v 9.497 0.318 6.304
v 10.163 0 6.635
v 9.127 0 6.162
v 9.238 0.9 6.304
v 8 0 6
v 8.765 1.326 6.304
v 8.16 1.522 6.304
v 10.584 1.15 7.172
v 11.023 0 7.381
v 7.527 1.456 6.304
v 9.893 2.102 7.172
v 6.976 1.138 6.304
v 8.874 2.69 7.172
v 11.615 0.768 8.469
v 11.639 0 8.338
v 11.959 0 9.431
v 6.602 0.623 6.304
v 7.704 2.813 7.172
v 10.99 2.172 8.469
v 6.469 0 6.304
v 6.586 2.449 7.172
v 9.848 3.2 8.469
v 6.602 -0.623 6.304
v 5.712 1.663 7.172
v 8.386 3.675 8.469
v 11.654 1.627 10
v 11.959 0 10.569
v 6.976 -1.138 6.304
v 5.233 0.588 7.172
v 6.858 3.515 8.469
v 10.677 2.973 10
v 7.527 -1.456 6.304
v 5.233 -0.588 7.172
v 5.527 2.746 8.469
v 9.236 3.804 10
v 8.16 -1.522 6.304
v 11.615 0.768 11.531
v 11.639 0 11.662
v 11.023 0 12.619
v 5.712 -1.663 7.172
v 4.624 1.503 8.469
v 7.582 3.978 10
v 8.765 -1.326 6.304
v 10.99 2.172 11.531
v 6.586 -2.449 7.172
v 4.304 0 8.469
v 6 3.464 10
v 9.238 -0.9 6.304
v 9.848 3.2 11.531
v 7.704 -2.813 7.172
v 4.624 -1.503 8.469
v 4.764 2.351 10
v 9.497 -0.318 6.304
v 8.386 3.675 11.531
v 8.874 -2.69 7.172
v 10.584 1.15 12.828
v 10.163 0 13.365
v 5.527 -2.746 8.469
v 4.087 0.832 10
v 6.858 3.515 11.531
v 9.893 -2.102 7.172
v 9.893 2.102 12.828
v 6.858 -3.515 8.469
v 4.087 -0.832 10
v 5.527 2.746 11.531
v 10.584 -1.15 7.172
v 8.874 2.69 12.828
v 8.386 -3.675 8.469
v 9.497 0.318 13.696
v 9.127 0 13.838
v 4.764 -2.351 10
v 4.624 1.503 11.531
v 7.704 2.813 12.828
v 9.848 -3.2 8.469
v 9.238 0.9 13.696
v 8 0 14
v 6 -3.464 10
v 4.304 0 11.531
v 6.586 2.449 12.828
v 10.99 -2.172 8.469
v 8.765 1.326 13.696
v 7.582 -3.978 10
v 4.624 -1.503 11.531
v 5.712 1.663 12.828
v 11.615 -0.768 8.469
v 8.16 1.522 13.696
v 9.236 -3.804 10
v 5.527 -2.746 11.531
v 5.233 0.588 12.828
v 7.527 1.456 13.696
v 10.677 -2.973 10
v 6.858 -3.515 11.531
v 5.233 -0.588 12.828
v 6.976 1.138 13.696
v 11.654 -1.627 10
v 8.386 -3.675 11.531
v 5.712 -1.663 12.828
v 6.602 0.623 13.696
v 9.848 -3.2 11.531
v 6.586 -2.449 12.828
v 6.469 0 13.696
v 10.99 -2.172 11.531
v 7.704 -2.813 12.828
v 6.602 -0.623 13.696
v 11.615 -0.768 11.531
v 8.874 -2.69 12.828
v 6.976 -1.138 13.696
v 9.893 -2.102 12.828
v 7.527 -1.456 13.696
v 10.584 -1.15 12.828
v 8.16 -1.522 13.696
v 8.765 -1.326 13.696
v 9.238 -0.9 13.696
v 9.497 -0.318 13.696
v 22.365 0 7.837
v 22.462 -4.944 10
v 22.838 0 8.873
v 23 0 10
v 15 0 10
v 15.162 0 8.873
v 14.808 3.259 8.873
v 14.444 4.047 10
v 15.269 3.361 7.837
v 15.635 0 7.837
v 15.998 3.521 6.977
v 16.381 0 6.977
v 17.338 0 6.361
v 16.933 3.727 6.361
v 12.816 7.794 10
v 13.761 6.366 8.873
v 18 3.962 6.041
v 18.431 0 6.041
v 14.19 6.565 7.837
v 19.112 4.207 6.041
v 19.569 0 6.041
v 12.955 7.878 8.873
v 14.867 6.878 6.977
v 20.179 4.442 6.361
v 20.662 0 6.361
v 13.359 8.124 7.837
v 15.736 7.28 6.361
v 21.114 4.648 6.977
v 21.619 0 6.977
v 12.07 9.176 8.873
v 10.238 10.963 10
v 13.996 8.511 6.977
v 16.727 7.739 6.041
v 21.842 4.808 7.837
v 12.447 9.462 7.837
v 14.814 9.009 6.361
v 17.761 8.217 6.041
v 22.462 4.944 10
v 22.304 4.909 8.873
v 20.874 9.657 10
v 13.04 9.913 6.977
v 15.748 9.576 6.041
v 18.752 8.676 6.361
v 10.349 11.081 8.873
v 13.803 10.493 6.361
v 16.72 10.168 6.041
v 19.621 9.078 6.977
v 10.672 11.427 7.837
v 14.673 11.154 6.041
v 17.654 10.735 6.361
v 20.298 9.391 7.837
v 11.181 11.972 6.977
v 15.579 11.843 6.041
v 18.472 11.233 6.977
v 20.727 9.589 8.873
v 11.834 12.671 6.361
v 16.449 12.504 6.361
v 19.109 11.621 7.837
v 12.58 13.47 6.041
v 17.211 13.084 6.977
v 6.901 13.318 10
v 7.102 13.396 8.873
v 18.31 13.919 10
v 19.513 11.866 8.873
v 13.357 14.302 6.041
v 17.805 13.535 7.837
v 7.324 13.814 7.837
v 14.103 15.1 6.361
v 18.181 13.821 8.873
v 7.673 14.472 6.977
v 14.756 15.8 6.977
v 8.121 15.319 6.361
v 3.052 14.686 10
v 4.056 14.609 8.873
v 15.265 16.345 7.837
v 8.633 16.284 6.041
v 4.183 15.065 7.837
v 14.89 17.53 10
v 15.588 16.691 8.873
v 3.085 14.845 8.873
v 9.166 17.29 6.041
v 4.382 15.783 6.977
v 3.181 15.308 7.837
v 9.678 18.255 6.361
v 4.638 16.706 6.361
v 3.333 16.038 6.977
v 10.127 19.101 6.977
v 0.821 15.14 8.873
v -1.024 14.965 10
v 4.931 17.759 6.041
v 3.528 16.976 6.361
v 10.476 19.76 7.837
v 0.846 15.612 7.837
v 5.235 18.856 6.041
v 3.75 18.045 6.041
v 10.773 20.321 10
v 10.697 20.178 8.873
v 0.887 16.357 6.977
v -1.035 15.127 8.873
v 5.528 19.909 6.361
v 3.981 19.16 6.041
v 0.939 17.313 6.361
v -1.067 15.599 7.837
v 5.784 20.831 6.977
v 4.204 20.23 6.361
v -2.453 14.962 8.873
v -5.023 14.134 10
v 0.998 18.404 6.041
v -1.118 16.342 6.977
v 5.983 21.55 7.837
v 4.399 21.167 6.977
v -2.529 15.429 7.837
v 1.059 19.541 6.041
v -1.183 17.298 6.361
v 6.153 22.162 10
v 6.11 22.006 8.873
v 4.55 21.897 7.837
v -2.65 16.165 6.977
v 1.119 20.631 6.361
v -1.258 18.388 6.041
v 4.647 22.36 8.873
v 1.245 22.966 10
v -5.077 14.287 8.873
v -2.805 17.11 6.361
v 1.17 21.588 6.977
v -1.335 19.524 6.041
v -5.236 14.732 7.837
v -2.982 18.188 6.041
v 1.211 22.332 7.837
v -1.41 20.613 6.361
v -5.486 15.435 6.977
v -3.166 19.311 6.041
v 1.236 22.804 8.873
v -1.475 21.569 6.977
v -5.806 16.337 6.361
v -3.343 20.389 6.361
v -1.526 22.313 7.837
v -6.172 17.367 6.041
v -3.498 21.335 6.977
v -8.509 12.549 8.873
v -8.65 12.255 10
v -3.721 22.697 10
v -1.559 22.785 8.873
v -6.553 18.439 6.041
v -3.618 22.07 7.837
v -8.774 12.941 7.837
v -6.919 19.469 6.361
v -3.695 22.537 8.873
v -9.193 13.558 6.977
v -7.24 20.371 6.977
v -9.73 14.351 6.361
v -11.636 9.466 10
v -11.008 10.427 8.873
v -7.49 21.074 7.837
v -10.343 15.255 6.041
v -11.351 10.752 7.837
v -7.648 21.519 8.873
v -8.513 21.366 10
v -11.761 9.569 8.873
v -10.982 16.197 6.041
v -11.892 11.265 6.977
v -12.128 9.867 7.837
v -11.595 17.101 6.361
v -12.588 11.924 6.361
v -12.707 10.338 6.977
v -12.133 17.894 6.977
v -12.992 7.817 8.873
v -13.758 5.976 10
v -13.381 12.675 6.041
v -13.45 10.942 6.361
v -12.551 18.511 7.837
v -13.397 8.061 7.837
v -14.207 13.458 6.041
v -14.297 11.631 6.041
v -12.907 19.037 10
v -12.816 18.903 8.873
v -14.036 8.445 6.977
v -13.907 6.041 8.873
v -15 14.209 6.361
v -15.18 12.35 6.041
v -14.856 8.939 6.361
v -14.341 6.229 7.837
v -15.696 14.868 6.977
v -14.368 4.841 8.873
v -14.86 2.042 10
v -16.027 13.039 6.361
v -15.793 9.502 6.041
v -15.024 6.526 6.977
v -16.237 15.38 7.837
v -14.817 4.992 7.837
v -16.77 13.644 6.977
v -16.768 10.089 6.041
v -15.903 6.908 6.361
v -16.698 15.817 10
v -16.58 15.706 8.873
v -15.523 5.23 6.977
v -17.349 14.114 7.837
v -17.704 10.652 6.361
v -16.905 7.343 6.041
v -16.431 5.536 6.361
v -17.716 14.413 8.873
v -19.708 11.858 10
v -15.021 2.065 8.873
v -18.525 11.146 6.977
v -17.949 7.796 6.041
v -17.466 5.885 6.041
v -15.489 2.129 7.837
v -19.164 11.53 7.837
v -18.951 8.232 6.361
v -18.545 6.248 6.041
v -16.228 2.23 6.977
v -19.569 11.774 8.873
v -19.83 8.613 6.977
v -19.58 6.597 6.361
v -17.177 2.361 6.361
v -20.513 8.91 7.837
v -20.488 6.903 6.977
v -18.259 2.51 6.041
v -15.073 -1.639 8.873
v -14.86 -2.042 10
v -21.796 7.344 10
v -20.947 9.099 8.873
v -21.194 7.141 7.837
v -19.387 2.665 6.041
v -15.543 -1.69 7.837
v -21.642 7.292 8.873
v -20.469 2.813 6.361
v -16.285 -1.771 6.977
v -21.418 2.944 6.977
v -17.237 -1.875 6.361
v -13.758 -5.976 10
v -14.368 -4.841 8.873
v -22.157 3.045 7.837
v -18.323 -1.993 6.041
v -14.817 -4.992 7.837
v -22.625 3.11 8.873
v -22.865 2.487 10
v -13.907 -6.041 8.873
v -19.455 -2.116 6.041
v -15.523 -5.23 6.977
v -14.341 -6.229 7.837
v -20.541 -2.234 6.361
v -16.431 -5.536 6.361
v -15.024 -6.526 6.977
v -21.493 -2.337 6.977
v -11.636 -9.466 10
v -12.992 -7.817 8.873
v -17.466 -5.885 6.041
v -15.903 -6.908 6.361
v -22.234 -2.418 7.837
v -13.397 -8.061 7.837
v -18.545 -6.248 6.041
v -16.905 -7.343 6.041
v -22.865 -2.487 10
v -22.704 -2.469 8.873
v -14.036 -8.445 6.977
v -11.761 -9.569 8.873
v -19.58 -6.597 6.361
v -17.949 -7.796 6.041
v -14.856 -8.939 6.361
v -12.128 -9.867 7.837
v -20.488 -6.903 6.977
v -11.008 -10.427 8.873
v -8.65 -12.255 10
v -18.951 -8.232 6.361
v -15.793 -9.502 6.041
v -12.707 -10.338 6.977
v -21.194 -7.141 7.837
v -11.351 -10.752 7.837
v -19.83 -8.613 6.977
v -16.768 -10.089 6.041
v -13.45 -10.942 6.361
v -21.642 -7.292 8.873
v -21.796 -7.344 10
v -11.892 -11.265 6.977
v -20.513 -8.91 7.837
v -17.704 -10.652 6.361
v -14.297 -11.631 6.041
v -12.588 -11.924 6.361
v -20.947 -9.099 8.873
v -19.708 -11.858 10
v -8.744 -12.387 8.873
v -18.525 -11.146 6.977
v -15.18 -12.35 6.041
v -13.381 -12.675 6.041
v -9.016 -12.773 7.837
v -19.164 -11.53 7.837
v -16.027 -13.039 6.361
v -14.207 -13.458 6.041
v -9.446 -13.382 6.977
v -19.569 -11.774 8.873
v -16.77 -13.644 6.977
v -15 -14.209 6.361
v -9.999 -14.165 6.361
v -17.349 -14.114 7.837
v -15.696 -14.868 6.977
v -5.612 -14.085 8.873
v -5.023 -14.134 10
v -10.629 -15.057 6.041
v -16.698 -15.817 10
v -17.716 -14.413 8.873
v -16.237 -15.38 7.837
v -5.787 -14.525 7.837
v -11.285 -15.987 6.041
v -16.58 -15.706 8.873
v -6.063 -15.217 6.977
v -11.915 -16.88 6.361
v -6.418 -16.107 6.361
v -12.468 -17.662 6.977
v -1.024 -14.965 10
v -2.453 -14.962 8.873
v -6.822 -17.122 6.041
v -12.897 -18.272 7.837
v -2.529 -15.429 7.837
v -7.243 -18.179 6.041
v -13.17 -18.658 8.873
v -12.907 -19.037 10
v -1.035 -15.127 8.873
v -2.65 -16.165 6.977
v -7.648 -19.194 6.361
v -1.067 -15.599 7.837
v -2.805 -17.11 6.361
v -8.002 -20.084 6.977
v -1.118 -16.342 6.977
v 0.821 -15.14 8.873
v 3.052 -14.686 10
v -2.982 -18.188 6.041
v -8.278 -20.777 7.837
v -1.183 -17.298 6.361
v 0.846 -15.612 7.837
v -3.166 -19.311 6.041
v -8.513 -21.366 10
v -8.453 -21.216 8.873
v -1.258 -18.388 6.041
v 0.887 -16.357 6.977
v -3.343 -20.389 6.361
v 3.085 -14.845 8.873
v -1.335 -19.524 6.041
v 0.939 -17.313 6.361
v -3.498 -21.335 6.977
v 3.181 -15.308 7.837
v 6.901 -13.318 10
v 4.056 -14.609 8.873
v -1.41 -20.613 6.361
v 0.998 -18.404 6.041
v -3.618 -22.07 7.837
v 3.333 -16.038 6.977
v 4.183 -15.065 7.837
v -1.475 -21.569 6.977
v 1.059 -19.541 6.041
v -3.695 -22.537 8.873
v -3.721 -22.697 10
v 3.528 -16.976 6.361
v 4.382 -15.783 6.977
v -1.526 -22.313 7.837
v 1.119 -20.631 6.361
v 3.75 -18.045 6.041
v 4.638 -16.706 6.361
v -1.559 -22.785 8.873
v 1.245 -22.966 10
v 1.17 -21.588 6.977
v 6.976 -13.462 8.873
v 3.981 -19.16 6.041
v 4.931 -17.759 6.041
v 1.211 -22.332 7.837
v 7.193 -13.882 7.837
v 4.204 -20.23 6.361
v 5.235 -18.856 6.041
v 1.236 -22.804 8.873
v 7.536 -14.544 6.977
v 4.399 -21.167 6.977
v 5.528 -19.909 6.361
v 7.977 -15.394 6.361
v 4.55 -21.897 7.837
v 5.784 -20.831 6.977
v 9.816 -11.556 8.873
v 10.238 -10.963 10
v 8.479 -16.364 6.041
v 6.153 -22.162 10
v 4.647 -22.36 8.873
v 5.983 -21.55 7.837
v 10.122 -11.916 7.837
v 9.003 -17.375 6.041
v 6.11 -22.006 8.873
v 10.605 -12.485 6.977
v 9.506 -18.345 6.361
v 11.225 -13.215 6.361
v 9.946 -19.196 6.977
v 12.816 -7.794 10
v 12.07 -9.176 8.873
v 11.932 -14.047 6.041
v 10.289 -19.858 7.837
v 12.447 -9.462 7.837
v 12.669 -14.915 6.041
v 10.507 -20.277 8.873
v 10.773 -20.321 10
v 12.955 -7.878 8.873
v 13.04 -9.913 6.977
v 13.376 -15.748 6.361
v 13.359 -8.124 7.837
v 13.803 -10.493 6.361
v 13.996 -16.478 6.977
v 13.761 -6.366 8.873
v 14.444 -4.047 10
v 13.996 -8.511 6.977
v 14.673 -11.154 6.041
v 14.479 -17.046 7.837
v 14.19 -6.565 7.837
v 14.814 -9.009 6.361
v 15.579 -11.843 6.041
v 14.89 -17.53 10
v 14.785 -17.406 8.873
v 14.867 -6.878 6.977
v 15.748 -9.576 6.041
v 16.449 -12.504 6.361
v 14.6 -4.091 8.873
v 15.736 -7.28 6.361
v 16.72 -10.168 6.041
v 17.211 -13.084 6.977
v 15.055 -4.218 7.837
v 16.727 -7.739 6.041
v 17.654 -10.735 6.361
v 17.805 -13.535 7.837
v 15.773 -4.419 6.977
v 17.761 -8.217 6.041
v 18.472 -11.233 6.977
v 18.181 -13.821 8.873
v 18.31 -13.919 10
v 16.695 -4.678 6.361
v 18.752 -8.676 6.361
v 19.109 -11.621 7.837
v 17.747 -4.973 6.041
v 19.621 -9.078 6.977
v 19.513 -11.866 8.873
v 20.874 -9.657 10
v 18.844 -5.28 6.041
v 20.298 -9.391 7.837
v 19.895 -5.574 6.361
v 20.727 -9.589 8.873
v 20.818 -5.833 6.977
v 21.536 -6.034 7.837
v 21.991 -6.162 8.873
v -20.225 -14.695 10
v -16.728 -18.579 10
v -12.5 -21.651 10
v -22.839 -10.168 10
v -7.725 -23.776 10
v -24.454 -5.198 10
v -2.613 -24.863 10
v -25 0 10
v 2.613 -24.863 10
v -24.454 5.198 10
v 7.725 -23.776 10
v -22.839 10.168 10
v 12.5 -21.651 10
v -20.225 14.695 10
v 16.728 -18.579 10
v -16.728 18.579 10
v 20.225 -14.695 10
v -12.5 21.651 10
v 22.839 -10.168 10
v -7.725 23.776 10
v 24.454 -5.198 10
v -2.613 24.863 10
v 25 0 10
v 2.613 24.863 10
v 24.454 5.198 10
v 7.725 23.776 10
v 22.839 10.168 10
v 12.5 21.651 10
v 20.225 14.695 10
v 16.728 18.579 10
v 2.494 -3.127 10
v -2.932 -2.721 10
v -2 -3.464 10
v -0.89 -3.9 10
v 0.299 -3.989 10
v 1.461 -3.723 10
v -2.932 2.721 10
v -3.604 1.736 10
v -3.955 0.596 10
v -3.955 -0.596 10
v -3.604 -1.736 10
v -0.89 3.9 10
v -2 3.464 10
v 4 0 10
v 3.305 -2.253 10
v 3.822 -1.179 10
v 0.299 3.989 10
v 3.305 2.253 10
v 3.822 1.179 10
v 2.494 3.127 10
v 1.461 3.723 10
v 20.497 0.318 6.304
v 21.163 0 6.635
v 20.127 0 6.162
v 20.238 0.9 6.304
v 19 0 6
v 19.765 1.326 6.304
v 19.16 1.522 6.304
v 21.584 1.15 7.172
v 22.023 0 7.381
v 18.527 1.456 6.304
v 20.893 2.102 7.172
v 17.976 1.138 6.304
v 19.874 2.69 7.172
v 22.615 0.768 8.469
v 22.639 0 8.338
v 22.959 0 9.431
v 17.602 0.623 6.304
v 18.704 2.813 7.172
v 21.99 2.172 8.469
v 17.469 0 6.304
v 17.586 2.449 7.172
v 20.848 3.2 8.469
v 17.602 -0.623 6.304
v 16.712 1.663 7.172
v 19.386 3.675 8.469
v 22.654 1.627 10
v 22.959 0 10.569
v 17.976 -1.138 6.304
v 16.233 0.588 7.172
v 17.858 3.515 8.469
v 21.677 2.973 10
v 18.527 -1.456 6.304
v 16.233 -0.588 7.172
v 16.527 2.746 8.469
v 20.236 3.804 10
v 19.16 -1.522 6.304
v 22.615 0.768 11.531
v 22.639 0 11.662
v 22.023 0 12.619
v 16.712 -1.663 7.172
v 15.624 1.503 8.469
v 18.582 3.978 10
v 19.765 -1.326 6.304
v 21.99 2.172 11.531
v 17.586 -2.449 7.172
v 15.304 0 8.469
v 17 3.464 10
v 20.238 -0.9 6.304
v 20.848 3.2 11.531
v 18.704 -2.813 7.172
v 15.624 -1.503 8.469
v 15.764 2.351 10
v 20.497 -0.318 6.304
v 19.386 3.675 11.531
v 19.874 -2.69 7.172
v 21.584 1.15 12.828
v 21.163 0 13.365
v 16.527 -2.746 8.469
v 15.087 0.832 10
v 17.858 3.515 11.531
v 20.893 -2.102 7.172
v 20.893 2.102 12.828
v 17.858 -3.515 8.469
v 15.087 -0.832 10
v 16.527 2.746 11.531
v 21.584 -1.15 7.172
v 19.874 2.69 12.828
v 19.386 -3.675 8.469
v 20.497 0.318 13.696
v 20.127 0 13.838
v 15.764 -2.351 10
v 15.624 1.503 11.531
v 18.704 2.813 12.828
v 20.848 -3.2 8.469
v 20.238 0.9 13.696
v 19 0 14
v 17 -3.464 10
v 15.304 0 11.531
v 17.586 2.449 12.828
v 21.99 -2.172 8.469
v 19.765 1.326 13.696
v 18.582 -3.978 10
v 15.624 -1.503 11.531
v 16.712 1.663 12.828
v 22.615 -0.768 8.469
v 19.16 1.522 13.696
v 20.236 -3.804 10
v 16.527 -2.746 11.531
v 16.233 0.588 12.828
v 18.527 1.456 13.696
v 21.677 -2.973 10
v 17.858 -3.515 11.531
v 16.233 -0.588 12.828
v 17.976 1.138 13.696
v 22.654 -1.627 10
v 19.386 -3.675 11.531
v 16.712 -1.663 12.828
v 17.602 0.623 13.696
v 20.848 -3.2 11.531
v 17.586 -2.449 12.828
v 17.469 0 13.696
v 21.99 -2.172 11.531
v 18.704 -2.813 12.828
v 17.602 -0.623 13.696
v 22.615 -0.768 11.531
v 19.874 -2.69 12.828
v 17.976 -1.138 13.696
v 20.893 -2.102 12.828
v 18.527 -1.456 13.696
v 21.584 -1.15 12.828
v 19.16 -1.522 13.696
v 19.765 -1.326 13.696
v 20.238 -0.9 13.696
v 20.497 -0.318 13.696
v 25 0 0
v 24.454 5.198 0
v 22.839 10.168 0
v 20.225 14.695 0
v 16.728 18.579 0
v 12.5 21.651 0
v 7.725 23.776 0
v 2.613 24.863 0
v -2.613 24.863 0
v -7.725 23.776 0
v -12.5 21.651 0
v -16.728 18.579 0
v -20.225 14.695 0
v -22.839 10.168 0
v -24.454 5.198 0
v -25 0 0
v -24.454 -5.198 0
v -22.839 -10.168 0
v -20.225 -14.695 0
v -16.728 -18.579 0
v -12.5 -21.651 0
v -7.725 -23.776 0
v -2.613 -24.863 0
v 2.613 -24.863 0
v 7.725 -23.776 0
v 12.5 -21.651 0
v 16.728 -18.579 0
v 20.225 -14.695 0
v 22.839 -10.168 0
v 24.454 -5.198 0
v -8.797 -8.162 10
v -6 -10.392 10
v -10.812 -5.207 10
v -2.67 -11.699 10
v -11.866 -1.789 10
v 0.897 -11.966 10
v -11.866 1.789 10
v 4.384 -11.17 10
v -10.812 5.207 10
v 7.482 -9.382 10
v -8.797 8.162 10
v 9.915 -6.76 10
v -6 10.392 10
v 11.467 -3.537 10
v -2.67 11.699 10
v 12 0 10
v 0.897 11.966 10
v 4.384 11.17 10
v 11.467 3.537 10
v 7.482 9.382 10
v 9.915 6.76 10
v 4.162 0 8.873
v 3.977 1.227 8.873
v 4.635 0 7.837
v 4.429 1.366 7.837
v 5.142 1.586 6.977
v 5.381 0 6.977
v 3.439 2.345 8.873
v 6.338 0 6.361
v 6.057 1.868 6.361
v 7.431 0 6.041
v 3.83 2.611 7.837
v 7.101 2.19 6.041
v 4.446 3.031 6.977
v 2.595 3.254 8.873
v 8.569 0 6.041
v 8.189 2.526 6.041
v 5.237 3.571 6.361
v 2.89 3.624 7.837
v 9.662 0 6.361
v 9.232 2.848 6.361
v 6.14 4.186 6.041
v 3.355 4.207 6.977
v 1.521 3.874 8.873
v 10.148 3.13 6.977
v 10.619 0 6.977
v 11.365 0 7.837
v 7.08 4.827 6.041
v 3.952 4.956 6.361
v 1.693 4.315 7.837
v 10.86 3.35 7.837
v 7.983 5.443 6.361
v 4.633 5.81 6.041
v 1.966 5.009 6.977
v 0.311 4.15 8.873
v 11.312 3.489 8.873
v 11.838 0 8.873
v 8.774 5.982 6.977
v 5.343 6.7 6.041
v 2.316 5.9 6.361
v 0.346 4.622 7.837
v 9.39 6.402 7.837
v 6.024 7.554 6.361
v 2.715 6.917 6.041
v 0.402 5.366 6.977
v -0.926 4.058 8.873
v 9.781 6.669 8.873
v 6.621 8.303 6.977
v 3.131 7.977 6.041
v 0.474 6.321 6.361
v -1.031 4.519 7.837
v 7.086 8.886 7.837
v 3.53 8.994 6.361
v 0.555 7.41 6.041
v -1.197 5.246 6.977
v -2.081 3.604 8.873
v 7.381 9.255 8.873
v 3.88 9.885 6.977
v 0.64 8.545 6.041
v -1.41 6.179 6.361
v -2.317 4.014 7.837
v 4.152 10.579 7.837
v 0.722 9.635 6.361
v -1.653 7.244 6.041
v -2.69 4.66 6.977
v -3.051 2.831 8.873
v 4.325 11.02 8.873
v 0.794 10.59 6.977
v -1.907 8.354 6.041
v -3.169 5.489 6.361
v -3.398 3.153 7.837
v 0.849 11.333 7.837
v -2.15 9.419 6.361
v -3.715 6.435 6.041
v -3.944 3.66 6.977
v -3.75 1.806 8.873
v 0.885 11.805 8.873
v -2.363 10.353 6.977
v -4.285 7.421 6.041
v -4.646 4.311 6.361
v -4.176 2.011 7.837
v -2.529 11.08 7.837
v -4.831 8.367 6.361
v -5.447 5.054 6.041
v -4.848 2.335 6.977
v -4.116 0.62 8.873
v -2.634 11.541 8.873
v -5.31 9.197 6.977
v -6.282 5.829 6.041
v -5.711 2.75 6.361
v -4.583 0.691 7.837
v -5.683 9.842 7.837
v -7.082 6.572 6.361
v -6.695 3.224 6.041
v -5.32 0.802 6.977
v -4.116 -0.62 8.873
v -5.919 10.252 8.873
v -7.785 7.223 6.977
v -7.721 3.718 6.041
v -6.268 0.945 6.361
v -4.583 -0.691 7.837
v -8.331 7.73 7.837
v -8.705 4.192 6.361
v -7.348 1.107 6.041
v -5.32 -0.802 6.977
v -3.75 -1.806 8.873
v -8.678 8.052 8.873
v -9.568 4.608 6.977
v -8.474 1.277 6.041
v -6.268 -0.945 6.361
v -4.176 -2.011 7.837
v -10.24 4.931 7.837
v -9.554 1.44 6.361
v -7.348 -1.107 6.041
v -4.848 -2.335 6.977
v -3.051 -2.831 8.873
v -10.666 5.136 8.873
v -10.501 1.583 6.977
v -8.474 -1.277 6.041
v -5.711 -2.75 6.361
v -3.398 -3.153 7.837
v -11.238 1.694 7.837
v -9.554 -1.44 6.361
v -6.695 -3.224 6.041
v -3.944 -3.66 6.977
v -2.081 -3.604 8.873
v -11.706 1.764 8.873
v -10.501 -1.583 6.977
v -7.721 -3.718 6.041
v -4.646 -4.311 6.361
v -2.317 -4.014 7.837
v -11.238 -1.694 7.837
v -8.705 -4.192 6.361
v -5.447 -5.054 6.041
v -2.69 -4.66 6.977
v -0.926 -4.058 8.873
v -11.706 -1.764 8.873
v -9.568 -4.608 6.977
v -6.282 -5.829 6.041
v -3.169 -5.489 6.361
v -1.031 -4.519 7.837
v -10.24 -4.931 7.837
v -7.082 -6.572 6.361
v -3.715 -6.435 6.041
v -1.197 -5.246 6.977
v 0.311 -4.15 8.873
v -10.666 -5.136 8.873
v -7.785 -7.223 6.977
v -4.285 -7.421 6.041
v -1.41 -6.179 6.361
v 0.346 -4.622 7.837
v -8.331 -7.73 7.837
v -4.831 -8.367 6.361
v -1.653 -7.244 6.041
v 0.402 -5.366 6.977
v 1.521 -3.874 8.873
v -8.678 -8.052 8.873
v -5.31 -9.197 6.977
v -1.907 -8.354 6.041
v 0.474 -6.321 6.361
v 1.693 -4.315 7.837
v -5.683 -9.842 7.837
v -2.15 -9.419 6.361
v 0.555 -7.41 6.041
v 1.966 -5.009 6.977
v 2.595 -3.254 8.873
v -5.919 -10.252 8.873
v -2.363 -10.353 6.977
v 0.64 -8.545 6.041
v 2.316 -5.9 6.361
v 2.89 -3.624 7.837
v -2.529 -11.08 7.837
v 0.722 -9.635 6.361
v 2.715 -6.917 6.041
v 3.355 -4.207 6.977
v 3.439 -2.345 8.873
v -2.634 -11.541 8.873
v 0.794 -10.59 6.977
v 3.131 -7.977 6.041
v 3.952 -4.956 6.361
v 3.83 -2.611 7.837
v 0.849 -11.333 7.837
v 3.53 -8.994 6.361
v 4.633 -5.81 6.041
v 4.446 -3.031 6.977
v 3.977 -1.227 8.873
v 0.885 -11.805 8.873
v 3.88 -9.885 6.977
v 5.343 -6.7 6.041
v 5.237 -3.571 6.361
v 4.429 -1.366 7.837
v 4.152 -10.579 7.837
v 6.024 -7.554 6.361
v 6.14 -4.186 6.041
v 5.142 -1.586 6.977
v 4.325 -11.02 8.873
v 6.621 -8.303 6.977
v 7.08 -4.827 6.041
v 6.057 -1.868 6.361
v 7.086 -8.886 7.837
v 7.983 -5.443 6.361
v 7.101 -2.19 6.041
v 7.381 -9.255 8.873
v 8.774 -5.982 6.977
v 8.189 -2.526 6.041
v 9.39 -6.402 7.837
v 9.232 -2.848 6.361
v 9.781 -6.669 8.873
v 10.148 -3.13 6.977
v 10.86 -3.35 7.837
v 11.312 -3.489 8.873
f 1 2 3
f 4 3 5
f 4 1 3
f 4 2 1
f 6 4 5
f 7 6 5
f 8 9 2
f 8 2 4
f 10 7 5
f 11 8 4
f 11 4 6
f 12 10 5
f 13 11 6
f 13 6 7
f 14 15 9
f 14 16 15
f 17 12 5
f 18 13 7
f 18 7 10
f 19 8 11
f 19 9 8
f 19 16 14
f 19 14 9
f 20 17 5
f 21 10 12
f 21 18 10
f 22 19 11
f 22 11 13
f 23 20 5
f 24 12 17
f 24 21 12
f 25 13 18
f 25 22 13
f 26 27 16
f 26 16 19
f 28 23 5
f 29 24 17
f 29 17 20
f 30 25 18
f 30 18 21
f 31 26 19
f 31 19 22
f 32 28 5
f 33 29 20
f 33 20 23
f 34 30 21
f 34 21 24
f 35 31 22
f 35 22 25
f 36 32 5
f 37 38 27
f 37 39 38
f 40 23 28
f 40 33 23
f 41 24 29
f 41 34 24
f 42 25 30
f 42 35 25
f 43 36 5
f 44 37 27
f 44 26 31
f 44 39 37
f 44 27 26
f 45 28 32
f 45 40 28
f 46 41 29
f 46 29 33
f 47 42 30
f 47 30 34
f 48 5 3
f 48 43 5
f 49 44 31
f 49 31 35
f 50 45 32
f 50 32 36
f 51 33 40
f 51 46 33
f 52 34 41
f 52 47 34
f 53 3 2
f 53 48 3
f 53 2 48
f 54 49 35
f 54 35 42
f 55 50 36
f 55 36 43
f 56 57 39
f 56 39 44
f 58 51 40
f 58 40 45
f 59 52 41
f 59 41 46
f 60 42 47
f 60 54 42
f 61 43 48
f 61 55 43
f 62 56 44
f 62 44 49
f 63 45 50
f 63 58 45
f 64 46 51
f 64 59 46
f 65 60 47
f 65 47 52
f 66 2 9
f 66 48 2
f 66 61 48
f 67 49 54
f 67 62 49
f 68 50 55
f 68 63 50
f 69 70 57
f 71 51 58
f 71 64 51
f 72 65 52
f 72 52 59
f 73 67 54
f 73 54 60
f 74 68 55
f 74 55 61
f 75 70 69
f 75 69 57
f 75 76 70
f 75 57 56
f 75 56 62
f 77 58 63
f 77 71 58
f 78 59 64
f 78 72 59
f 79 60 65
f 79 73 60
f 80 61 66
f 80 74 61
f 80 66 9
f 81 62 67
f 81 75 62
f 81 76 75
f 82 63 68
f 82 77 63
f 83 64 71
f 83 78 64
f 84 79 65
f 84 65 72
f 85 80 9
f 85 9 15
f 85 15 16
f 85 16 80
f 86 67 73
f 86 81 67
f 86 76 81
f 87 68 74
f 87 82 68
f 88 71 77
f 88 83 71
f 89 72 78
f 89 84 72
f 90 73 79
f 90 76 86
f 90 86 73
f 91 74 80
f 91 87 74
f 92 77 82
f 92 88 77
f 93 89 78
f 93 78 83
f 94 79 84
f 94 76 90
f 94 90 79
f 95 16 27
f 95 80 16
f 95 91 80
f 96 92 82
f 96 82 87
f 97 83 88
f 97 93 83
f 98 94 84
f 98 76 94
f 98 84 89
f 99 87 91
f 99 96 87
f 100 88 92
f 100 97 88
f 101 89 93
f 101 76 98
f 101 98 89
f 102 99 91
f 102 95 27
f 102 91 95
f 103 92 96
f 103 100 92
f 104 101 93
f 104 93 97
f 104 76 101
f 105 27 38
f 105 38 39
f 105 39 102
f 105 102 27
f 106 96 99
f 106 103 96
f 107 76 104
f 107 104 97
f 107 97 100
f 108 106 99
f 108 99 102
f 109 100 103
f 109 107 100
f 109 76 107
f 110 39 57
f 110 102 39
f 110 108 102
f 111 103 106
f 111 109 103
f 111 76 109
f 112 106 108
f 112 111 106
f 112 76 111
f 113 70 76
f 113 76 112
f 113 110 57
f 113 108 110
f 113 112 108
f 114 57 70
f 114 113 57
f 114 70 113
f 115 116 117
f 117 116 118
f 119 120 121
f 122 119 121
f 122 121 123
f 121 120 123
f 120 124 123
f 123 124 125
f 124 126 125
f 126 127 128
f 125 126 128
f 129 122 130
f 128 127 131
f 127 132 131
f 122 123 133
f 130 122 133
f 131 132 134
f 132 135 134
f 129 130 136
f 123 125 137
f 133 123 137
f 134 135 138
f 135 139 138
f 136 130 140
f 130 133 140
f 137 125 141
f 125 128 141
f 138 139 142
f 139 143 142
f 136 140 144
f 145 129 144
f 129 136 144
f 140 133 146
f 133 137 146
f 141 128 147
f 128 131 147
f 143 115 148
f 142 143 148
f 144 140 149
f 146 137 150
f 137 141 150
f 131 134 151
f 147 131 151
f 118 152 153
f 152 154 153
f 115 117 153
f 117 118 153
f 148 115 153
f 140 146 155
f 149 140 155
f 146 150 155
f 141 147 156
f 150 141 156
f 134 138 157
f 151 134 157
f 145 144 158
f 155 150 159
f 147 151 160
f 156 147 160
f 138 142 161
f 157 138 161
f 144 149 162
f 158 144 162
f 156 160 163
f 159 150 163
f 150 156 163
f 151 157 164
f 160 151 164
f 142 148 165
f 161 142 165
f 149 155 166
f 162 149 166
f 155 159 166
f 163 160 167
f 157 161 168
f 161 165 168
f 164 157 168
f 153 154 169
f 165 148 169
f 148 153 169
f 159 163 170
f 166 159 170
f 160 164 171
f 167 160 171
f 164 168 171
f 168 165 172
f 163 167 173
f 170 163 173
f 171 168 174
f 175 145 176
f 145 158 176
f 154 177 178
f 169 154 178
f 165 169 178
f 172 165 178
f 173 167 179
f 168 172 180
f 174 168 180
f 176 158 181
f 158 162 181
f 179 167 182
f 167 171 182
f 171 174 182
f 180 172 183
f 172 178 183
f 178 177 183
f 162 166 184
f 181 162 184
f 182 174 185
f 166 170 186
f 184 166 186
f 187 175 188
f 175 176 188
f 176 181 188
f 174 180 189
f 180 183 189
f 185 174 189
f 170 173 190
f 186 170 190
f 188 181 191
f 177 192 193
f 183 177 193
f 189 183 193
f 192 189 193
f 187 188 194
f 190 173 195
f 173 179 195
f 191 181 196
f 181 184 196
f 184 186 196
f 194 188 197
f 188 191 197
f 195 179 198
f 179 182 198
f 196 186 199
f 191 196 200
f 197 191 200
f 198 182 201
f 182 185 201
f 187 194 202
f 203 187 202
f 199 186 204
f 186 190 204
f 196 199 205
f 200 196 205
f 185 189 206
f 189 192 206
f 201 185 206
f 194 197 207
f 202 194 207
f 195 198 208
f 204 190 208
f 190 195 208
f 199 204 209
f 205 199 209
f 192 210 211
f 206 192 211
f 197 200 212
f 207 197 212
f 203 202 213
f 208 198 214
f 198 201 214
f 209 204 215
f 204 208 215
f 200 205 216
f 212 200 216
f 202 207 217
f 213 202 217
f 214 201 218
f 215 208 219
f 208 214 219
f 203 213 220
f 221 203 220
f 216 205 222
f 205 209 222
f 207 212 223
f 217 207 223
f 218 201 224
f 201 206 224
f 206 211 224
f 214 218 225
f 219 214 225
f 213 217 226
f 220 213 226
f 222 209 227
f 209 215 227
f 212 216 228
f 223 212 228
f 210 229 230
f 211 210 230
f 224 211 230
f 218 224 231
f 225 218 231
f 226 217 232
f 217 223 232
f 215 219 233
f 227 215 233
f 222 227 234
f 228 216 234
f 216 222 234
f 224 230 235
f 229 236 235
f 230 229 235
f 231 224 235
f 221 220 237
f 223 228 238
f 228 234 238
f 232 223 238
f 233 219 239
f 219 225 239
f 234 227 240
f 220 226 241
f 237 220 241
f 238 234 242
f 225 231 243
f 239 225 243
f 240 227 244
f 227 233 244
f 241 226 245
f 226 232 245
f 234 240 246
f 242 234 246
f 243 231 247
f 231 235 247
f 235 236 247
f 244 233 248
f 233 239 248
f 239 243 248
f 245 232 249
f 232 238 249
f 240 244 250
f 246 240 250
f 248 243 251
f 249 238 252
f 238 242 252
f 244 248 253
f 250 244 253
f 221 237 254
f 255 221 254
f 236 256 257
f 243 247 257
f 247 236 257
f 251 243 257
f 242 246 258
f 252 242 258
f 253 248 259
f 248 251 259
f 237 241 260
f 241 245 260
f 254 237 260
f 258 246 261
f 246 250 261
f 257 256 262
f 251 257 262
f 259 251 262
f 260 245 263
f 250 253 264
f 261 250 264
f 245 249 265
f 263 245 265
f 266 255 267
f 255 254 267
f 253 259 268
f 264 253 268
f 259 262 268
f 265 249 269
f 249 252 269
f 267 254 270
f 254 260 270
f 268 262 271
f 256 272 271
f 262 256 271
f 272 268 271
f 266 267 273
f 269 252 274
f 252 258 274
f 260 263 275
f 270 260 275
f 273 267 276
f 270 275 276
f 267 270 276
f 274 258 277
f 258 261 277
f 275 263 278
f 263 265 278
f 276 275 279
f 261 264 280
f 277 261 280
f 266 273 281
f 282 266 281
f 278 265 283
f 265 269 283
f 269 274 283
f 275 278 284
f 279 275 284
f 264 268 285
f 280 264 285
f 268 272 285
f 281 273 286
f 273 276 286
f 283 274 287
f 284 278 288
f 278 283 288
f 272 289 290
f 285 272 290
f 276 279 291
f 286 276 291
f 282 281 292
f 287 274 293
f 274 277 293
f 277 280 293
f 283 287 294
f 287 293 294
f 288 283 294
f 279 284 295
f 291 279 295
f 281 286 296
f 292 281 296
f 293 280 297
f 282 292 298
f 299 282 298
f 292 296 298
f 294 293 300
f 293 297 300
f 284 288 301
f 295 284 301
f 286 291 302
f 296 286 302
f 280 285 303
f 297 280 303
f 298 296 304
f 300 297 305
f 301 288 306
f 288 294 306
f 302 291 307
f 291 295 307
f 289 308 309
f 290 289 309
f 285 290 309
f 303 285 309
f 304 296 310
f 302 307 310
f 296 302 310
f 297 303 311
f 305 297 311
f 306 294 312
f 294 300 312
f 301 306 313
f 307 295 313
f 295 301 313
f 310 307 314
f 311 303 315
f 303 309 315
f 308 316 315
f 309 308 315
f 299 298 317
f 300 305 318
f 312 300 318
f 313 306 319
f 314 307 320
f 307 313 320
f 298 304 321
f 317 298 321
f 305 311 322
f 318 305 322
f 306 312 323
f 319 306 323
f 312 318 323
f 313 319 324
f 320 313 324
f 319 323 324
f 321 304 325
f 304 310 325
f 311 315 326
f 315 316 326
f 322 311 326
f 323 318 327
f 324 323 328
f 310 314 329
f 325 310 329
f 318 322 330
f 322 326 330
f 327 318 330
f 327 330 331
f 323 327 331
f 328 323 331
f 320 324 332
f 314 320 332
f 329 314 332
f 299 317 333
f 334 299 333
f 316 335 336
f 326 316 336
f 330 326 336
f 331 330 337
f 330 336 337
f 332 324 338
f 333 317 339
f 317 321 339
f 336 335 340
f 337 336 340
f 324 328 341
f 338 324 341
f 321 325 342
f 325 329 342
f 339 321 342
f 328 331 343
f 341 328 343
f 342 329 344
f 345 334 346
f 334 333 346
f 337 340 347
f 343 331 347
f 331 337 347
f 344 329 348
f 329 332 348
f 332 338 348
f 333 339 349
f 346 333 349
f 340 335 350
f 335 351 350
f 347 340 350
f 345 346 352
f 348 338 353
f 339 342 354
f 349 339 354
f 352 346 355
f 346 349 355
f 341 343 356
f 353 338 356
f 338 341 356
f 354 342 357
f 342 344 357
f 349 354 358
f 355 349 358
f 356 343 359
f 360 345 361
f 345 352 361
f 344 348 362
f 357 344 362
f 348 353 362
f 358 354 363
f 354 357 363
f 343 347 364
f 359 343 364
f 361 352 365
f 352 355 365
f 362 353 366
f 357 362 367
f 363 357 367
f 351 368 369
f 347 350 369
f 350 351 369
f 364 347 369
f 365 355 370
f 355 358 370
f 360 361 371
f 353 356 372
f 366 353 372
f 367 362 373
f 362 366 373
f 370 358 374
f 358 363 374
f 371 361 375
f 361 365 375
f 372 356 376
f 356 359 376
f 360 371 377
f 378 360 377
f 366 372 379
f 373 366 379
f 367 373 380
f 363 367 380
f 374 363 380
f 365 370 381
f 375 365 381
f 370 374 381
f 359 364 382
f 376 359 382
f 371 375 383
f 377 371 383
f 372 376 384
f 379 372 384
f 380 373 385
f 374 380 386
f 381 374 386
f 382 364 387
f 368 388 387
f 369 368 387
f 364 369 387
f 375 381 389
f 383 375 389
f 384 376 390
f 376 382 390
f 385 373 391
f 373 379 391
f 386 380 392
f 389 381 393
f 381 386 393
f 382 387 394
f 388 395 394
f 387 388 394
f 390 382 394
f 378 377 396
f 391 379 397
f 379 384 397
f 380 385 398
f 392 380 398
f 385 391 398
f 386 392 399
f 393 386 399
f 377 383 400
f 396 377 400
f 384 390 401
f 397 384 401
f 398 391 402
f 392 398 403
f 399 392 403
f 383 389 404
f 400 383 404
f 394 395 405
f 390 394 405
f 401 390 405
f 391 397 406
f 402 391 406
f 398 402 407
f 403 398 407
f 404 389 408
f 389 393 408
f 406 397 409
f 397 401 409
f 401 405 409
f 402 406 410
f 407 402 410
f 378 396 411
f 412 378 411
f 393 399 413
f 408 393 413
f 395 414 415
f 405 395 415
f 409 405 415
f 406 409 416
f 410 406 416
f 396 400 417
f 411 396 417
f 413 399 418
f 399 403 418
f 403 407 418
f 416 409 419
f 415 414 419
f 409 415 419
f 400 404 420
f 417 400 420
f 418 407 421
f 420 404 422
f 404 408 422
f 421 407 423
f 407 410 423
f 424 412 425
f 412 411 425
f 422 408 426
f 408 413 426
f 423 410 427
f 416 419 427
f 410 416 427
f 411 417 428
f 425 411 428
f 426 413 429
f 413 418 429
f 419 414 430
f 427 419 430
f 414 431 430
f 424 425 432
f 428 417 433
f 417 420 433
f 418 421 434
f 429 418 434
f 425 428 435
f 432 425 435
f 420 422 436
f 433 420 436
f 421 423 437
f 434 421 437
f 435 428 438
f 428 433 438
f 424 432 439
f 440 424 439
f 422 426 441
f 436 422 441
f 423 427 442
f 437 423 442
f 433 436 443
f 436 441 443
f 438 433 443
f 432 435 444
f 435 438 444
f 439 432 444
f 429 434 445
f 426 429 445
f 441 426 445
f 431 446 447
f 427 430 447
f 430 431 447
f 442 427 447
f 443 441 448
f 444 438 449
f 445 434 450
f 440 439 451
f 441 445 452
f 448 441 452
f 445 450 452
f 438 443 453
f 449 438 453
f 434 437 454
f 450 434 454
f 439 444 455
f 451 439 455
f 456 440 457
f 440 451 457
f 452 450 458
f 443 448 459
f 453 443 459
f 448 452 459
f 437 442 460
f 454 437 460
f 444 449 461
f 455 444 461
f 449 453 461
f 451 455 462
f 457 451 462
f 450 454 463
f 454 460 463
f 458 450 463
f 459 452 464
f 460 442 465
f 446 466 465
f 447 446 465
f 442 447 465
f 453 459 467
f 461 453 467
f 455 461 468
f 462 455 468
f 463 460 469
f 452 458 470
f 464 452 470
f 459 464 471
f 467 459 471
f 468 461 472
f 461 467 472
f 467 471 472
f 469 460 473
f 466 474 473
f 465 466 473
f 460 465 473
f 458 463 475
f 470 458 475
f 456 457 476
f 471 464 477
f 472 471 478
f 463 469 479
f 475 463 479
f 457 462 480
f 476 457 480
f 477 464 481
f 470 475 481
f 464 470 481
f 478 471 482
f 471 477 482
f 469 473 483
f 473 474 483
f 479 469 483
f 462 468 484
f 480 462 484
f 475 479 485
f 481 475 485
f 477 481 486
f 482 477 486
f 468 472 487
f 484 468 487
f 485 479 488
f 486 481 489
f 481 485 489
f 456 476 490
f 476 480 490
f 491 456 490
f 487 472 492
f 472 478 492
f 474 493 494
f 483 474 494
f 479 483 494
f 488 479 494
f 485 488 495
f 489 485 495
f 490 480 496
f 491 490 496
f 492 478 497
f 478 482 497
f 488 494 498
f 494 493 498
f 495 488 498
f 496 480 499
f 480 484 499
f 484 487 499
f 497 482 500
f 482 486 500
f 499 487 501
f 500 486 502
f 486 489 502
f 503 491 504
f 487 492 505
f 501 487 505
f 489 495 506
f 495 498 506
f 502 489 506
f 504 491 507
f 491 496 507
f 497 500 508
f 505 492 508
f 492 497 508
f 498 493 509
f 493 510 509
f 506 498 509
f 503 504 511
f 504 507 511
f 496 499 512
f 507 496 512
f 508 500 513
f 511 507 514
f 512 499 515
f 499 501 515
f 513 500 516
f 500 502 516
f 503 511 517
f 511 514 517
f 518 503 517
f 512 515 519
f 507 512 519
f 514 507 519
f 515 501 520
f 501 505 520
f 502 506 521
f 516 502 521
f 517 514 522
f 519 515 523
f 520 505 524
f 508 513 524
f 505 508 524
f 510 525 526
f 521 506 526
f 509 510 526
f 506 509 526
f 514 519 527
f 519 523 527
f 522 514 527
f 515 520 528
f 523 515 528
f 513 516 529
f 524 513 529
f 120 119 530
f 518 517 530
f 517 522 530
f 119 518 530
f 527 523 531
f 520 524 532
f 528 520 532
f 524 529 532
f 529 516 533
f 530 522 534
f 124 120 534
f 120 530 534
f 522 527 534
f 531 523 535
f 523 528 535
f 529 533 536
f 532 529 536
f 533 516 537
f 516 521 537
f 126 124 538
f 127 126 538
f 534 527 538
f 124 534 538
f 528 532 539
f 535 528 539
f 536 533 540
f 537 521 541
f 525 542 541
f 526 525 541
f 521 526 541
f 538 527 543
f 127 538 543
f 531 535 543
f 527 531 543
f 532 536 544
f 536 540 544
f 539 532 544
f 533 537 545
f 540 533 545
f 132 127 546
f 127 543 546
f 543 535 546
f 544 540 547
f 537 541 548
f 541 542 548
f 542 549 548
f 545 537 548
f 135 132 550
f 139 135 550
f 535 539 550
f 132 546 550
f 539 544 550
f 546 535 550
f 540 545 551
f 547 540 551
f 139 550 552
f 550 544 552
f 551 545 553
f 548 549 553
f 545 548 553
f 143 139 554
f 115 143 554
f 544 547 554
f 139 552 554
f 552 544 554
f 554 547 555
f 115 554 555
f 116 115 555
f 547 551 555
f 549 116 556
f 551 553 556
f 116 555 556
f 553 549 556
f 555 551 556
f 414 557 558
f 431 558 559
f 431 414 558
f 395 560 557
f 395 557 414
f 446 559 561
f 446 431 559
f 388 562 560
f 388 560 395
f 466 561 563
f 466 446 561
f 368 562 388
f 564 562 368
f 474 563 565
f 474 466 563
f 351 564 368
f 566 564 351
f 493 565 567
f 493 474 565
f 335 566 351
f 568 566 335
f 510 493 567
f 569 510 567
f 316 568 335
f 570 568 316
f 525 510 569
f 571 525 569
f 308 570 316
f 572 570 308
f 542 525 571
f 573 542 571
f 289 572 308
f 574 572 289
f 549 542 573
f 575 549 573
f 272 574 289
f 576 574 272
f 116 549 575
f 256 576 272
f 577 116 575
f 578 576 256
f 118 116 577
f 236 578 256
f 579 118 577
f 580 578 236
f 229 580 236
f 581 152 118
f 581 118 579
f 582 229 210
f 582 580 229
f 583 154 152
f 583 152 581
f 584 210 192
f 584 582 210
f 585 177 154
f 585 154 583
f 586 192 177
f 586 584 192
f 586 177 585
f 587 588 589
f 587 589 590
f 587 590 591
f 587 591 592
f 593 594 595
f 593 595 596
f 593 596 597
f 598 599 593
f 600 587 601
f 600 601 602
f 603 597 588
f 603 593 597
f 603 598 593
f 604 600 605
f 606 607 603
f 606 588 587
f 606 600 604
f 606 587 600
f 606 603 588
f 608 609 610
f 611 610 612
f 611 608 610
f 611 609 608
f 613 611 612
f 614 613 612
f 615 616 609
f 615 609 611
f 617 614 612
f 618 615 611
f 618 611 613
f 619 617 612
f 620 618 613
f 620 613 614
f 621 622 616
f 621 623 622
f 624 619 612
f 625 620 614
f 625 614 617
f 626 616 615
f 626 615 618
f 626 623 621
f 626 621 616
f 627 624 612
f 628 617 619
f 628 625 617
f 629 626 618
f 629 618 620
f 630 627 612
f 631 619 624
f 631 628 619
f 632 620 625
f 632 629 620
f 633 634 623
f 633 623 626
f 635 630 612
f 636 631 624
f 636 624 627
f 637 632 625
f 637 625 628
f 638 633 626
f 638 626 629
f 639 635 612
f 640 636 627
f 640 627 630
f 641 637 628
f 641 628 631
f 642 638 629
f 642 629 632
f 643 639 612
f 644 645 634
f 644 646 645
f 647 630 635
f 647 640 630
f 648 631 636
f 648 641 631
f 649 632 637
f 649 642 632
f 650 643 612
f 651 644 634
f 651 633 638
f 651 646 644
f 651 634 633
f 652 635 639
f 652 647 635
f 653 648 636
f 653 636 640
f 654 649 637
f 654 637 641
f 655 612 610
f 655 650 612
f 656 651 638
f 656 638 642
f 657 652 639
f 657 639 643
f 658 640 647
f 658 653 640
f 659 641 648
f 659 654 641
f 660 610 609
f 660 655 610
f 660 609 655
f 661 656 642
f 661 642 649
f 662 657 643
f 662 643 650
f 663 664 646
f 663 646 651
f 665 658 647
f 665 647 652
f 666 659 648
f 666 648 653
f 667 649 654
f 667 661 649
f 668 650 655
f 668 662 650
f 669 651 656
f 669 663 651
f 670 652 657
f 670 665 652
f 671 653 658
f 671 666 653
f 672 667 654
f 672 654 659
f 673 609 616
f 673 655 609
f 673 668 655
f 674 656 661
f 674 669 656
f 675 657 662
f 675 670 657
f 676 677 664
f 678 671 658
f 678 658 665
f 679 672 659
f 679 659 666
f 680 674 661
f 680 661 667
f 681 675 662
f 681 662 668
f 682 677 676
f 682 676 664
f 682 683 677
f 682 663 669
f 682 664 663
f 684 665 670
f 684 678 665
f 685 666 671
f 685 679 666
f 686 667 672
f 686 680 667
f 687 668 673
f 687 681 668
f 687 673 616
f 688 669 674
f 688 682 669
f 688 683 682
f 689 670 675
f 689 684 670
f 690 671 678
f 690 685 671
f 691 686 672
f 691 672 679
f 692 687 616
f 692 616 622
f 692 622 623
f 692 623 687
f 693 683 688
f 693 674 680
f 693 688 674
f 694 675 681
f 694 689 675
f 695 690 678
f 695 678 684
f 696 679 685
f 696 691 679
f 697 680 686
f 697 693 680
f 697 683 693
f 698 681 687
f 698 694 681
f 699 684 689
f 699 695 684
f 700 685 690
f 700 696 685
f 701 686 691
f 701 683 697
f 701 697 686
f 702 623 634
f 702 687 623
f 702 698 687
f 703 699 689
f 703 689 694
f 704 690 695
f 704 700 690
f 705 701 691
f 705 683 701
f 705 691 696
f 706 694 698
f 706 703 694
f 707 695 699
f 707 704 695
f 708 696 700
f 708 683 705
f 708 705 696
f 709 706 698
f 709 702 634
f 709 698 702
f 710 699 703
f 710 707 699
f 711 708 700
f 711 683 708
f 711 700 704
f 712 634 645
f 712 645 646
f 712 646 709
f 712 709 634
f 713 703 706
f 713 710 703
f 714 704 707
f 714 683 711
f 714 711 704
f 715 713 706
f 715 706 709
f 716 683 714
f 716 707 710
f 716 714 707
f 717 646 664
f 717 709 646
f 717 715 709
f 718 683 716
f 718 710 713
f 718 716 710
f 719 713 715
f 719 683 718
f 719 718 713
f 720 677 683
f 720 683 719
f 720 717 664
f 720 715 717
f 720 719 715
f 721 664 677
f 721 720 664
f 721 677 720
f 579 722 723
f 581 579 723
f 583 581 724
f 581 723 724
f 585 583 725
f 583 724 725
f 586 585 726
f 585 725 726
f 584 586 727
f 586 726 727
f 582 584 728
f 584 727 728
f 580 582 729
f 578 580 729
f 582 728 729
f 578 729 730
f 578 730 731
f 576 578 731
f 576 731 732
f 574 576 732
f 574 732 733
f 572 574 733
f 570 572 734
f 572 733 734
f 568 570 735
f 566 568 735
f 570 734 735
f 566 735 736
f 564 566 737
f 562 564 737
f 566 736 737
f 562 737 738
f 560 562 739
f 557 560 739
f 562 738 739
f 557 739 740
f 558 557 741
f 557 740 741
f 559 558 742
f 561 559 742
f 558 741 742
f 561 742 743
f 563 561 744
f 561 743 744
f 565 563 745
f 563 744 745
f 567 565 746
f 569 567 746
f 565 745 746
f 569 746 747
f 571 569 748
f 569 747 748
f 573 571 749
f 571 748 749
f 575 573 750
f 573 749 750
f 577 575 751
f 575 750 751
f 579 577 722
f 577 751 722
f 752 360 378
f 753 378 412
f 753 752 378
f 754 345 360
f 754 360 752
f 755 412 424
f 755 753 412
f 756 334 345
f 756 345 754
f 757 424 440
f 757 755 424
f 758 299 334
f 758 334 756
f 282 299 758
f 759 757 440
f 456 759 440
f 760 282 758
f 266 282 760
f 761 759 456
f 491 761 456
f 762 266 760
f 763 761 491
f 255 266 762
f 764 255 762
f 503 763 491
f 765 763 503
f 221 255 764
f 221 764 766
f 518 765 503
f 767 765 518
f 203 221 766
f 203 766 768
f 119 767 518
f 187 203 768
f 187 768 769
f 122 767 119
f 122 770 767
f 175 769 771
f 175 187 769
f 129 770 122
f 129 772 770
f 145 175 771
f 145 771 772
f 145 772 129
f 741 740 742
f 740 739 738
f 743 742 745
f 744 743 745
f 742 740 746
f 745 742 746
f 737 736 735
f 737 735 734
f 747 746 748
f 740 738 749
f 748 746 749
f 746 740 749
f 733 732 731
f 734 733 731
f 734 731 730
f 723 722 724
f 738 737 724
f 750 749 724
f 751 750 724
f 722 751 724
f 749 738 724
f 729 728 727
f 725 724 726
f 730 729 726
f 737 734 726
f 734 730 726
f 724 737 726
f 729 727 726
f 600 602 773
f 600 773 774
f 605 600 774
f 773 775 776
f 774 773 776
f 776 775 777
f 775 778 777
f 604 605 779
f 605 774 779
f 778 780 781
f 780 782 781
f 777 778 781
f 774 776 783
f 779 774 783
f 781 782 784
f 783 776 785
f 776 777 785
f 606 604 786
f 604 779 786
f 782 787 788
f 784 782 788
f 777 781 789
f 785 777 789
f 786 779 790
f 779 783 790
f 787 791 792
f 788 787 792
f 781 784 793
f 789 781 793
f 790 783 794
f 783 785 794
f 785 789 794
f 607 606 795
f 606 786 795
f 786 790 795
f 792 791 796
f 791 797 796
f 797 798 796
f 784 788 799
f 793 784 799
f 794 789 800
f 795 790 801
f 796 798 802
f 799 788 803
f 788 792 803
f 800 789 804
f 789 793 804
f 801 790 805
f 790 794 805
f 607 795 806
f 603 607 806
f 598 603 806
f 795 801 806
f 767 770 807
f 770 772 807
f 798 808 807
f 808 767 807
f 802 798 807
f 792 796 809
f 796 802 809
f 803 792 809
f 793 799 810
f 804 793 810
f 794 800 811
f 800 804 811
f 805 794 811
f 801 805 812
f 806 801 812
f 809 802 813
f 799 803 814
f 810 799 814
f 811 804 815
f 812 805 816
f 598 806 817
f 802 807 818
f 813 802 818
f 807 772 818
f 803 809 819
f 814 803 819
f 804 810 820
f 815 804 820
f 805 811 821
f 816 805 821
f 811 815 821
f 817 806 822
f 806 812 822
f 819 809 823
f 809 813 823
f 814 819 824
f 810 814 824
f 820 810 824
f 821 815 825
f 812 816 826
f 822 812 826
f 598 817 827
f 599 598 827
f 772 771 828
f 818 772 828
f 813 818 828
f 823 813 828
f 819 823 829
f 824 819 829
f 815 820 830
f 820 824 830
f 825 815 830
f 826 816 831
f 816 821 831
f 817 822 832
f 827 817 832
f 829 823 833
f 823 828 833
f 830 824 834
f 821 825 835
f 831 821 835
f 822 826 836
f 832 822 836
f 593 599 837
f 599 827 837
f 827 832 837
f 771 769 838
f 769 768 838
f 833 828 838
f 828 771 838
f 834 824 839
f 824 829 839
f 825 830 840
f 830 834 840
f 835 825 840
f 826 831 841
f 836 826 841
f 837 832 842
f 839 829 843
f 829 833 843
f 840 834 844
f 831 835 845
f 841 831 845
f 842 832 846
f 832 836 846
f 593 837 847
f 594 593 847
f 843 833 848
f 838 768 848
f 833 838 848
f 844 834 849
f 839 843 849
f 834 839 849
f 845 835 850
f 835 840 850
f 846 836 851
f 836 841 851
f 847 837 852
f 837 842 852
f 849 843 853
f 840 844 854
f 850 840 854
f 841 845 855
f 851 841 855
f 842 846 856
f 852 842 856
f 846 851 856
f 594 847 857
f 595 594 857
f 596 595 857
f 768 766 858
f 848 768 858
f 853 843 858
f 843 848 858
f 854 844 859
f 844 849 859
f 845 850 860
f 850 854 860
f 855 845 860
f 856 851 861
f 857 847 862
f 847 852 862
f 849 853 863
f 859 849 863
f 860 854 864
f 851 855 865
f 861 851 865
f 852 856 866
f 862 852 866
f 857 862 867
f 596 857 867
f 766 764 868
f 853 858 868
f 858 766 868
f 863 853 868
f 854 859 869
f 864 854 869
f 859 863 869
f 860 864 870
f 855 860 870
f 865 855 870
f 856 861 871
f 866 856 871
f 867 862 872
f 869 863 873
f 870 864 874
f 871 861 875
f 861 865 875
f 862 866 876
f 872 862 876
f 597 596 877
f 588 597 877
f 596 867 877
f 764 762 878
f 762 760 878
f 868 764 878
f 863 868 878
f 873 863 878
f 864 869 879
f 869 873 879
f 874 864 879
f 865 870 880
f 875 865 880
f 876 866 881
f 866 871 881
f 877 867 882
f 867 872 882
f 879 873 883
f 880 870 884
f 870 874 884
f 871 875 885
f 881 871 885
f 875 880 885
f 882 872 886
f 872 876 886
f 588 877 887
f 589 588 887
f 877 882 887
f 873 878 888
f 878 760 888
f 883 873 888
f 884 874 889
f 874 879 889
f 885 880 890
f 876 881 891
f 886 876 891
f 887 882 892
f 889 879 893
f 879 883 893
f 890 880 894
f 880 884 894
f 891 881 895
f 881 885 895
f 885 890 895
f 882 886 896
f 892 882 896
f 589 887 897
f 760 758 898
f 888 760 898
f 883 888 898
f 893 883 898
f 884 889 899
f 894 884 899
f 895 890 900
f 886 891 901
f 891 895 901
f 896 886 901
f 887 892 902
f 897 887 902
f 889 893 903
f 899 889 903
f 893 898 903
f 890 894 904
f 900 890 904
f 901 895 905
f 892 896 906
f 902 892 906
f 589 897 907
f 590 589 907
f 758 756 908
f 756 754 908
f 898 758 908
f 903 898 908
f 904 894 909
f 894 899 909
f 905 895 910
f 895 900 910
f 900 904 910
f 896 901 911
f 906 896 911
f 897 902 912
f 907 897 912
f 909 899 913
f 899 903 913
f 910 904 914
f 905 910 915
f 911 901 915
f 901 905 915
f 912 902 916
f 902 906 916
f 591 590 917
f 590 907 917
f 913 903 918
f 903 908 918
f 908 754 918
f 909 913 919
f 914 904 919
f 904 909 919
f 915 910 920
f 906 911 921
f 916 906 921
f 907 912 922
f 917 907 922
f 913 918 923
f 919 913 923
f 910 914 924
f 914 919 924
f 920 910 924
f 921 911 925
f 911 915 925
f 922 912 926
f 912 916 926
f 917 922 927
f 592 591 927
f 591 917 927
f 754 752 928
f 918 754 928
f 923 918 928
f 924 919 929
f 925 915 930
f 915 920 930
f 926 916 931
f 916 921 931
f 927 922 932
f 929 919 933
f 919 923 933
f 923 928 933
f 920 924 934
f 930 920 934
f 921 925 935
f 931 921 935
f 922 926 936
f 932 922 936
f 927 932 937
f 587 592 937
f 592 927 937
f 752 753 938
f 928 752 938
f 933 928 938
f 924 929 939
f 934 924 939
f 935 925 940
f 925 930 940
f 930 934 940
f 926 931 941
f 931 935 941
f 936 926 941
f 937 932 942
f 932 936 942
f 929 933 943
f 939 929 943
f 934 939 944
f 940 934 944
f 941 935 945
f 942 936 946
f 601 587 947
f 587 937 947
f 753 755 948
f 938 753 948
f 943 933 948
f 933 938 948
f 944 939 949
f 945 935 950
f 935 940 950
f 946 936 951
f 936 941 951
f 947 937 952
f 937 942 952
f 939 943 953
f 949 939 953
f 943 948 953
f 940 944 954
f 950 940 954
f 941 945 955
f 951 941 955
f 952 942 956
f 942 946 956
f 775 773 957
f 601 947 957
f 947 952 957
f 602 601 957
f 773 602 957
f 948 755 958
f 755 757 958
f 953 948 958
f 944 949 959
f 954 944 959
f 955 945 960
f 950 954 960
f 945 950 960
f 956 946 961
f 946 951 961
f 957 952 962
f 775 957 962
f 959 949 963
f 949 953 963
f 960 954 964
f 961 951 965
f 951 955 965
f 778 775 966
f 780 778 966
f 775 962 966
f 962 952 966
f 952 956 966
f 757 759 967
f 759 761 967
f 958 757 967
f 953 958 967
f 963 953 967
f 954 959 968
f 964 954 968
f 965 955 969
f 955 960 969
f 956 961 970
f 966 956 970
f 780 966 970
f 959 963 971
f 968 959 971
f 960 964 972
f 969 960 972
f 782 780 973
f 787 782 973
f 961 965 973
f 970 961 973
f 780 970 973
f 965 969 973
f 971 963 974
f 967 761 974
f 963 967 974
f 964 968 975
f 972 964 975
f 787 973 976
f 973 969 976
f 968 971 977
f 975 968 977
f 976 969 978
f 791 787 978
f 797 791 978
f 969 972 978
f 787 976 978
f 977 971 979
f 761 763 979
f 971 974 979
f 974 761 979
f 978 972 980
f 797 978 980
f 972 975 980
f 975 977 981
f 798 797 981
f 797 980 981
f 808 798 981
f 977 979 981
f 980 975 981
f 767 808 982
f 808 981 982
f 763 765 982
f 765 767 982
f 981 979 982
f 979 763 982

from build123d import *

# Parameters (mm, degrees)
TORUS001_R     = 4
TORUS_R        = 4
CYLINDER_R     = 25
CYLINDER_DEPTH = 10


with BuildPart() as torus001:
    # Torus001 → Torus001 (revolve)
    with BuildSketch(Plane(origin=(0, 0, 10), x_dir=(1, 0, 0), z_dir=(0, -1, 0))):
        with Locations((8, 0)):
            Circle(TORUS001_R)
    revolve(axis=Axis((0, 0, 10), (0, 0, 1)))


with BuildPart() as torus:
    # Torus → Torus (revolve)
    with BuildSketch(Plane(origin=(0, 0, 10), x_dir=(1, 0, 0), z_dir=(0, -1, 0))):
        with Locations((19, 0)):
            Circle(TORUS_R)
    revolve(axis=Axis((0, 0, 10), (0, 0, 1)))


with BuildPart() as cut001:
    # Cylinder → Cylinder (new body)
    with BuildSketch(Plane.XY):
        Circle(CYLINDER_R)
    extrude(amount=CYLINDER_DEPTH)

    # Cut: cut Torus
    add(torus.part, mode=Mode.SUBTRACT)

    # Cut001: cut Torus001
    add(torus001.part, mode=Mode.SUBTRACT)


with BuildPart() as esfera:
    # Sphere → Sphere (revolve)
    with BuildSketch(Plane(origin=(8, 0, 10), x_dir=(1, 0, 0), z_dir=(0, -1, 0))):
        with BuildLine():
            ThreePointArc((0, -4), (4, 0), (0, 4))
            Line((0, 4), (0, -4))
        make_face()
    revolve(axis=Axis((8, 0, 10), (0, 0, 1)))


with BuildPart() as esfera001:
    # Sphere001 → Sphere001 (revolve)
    with BuildSketch(Plane(origin=(19, 0, 10), x_dir=(1, 0, 0), z_dir=(0, -1, 0))):
        with BuildLine():
            ThreePointArc((0, -4), (4, 0), (0, 4))
            Line((0, 4), (0, -4))
        make_face()
    revolve(axis=Axis((19, 0, 10), (0, 0, 1)))


solid = Compound([cut001.part, esfera.part, esfera001.part])
